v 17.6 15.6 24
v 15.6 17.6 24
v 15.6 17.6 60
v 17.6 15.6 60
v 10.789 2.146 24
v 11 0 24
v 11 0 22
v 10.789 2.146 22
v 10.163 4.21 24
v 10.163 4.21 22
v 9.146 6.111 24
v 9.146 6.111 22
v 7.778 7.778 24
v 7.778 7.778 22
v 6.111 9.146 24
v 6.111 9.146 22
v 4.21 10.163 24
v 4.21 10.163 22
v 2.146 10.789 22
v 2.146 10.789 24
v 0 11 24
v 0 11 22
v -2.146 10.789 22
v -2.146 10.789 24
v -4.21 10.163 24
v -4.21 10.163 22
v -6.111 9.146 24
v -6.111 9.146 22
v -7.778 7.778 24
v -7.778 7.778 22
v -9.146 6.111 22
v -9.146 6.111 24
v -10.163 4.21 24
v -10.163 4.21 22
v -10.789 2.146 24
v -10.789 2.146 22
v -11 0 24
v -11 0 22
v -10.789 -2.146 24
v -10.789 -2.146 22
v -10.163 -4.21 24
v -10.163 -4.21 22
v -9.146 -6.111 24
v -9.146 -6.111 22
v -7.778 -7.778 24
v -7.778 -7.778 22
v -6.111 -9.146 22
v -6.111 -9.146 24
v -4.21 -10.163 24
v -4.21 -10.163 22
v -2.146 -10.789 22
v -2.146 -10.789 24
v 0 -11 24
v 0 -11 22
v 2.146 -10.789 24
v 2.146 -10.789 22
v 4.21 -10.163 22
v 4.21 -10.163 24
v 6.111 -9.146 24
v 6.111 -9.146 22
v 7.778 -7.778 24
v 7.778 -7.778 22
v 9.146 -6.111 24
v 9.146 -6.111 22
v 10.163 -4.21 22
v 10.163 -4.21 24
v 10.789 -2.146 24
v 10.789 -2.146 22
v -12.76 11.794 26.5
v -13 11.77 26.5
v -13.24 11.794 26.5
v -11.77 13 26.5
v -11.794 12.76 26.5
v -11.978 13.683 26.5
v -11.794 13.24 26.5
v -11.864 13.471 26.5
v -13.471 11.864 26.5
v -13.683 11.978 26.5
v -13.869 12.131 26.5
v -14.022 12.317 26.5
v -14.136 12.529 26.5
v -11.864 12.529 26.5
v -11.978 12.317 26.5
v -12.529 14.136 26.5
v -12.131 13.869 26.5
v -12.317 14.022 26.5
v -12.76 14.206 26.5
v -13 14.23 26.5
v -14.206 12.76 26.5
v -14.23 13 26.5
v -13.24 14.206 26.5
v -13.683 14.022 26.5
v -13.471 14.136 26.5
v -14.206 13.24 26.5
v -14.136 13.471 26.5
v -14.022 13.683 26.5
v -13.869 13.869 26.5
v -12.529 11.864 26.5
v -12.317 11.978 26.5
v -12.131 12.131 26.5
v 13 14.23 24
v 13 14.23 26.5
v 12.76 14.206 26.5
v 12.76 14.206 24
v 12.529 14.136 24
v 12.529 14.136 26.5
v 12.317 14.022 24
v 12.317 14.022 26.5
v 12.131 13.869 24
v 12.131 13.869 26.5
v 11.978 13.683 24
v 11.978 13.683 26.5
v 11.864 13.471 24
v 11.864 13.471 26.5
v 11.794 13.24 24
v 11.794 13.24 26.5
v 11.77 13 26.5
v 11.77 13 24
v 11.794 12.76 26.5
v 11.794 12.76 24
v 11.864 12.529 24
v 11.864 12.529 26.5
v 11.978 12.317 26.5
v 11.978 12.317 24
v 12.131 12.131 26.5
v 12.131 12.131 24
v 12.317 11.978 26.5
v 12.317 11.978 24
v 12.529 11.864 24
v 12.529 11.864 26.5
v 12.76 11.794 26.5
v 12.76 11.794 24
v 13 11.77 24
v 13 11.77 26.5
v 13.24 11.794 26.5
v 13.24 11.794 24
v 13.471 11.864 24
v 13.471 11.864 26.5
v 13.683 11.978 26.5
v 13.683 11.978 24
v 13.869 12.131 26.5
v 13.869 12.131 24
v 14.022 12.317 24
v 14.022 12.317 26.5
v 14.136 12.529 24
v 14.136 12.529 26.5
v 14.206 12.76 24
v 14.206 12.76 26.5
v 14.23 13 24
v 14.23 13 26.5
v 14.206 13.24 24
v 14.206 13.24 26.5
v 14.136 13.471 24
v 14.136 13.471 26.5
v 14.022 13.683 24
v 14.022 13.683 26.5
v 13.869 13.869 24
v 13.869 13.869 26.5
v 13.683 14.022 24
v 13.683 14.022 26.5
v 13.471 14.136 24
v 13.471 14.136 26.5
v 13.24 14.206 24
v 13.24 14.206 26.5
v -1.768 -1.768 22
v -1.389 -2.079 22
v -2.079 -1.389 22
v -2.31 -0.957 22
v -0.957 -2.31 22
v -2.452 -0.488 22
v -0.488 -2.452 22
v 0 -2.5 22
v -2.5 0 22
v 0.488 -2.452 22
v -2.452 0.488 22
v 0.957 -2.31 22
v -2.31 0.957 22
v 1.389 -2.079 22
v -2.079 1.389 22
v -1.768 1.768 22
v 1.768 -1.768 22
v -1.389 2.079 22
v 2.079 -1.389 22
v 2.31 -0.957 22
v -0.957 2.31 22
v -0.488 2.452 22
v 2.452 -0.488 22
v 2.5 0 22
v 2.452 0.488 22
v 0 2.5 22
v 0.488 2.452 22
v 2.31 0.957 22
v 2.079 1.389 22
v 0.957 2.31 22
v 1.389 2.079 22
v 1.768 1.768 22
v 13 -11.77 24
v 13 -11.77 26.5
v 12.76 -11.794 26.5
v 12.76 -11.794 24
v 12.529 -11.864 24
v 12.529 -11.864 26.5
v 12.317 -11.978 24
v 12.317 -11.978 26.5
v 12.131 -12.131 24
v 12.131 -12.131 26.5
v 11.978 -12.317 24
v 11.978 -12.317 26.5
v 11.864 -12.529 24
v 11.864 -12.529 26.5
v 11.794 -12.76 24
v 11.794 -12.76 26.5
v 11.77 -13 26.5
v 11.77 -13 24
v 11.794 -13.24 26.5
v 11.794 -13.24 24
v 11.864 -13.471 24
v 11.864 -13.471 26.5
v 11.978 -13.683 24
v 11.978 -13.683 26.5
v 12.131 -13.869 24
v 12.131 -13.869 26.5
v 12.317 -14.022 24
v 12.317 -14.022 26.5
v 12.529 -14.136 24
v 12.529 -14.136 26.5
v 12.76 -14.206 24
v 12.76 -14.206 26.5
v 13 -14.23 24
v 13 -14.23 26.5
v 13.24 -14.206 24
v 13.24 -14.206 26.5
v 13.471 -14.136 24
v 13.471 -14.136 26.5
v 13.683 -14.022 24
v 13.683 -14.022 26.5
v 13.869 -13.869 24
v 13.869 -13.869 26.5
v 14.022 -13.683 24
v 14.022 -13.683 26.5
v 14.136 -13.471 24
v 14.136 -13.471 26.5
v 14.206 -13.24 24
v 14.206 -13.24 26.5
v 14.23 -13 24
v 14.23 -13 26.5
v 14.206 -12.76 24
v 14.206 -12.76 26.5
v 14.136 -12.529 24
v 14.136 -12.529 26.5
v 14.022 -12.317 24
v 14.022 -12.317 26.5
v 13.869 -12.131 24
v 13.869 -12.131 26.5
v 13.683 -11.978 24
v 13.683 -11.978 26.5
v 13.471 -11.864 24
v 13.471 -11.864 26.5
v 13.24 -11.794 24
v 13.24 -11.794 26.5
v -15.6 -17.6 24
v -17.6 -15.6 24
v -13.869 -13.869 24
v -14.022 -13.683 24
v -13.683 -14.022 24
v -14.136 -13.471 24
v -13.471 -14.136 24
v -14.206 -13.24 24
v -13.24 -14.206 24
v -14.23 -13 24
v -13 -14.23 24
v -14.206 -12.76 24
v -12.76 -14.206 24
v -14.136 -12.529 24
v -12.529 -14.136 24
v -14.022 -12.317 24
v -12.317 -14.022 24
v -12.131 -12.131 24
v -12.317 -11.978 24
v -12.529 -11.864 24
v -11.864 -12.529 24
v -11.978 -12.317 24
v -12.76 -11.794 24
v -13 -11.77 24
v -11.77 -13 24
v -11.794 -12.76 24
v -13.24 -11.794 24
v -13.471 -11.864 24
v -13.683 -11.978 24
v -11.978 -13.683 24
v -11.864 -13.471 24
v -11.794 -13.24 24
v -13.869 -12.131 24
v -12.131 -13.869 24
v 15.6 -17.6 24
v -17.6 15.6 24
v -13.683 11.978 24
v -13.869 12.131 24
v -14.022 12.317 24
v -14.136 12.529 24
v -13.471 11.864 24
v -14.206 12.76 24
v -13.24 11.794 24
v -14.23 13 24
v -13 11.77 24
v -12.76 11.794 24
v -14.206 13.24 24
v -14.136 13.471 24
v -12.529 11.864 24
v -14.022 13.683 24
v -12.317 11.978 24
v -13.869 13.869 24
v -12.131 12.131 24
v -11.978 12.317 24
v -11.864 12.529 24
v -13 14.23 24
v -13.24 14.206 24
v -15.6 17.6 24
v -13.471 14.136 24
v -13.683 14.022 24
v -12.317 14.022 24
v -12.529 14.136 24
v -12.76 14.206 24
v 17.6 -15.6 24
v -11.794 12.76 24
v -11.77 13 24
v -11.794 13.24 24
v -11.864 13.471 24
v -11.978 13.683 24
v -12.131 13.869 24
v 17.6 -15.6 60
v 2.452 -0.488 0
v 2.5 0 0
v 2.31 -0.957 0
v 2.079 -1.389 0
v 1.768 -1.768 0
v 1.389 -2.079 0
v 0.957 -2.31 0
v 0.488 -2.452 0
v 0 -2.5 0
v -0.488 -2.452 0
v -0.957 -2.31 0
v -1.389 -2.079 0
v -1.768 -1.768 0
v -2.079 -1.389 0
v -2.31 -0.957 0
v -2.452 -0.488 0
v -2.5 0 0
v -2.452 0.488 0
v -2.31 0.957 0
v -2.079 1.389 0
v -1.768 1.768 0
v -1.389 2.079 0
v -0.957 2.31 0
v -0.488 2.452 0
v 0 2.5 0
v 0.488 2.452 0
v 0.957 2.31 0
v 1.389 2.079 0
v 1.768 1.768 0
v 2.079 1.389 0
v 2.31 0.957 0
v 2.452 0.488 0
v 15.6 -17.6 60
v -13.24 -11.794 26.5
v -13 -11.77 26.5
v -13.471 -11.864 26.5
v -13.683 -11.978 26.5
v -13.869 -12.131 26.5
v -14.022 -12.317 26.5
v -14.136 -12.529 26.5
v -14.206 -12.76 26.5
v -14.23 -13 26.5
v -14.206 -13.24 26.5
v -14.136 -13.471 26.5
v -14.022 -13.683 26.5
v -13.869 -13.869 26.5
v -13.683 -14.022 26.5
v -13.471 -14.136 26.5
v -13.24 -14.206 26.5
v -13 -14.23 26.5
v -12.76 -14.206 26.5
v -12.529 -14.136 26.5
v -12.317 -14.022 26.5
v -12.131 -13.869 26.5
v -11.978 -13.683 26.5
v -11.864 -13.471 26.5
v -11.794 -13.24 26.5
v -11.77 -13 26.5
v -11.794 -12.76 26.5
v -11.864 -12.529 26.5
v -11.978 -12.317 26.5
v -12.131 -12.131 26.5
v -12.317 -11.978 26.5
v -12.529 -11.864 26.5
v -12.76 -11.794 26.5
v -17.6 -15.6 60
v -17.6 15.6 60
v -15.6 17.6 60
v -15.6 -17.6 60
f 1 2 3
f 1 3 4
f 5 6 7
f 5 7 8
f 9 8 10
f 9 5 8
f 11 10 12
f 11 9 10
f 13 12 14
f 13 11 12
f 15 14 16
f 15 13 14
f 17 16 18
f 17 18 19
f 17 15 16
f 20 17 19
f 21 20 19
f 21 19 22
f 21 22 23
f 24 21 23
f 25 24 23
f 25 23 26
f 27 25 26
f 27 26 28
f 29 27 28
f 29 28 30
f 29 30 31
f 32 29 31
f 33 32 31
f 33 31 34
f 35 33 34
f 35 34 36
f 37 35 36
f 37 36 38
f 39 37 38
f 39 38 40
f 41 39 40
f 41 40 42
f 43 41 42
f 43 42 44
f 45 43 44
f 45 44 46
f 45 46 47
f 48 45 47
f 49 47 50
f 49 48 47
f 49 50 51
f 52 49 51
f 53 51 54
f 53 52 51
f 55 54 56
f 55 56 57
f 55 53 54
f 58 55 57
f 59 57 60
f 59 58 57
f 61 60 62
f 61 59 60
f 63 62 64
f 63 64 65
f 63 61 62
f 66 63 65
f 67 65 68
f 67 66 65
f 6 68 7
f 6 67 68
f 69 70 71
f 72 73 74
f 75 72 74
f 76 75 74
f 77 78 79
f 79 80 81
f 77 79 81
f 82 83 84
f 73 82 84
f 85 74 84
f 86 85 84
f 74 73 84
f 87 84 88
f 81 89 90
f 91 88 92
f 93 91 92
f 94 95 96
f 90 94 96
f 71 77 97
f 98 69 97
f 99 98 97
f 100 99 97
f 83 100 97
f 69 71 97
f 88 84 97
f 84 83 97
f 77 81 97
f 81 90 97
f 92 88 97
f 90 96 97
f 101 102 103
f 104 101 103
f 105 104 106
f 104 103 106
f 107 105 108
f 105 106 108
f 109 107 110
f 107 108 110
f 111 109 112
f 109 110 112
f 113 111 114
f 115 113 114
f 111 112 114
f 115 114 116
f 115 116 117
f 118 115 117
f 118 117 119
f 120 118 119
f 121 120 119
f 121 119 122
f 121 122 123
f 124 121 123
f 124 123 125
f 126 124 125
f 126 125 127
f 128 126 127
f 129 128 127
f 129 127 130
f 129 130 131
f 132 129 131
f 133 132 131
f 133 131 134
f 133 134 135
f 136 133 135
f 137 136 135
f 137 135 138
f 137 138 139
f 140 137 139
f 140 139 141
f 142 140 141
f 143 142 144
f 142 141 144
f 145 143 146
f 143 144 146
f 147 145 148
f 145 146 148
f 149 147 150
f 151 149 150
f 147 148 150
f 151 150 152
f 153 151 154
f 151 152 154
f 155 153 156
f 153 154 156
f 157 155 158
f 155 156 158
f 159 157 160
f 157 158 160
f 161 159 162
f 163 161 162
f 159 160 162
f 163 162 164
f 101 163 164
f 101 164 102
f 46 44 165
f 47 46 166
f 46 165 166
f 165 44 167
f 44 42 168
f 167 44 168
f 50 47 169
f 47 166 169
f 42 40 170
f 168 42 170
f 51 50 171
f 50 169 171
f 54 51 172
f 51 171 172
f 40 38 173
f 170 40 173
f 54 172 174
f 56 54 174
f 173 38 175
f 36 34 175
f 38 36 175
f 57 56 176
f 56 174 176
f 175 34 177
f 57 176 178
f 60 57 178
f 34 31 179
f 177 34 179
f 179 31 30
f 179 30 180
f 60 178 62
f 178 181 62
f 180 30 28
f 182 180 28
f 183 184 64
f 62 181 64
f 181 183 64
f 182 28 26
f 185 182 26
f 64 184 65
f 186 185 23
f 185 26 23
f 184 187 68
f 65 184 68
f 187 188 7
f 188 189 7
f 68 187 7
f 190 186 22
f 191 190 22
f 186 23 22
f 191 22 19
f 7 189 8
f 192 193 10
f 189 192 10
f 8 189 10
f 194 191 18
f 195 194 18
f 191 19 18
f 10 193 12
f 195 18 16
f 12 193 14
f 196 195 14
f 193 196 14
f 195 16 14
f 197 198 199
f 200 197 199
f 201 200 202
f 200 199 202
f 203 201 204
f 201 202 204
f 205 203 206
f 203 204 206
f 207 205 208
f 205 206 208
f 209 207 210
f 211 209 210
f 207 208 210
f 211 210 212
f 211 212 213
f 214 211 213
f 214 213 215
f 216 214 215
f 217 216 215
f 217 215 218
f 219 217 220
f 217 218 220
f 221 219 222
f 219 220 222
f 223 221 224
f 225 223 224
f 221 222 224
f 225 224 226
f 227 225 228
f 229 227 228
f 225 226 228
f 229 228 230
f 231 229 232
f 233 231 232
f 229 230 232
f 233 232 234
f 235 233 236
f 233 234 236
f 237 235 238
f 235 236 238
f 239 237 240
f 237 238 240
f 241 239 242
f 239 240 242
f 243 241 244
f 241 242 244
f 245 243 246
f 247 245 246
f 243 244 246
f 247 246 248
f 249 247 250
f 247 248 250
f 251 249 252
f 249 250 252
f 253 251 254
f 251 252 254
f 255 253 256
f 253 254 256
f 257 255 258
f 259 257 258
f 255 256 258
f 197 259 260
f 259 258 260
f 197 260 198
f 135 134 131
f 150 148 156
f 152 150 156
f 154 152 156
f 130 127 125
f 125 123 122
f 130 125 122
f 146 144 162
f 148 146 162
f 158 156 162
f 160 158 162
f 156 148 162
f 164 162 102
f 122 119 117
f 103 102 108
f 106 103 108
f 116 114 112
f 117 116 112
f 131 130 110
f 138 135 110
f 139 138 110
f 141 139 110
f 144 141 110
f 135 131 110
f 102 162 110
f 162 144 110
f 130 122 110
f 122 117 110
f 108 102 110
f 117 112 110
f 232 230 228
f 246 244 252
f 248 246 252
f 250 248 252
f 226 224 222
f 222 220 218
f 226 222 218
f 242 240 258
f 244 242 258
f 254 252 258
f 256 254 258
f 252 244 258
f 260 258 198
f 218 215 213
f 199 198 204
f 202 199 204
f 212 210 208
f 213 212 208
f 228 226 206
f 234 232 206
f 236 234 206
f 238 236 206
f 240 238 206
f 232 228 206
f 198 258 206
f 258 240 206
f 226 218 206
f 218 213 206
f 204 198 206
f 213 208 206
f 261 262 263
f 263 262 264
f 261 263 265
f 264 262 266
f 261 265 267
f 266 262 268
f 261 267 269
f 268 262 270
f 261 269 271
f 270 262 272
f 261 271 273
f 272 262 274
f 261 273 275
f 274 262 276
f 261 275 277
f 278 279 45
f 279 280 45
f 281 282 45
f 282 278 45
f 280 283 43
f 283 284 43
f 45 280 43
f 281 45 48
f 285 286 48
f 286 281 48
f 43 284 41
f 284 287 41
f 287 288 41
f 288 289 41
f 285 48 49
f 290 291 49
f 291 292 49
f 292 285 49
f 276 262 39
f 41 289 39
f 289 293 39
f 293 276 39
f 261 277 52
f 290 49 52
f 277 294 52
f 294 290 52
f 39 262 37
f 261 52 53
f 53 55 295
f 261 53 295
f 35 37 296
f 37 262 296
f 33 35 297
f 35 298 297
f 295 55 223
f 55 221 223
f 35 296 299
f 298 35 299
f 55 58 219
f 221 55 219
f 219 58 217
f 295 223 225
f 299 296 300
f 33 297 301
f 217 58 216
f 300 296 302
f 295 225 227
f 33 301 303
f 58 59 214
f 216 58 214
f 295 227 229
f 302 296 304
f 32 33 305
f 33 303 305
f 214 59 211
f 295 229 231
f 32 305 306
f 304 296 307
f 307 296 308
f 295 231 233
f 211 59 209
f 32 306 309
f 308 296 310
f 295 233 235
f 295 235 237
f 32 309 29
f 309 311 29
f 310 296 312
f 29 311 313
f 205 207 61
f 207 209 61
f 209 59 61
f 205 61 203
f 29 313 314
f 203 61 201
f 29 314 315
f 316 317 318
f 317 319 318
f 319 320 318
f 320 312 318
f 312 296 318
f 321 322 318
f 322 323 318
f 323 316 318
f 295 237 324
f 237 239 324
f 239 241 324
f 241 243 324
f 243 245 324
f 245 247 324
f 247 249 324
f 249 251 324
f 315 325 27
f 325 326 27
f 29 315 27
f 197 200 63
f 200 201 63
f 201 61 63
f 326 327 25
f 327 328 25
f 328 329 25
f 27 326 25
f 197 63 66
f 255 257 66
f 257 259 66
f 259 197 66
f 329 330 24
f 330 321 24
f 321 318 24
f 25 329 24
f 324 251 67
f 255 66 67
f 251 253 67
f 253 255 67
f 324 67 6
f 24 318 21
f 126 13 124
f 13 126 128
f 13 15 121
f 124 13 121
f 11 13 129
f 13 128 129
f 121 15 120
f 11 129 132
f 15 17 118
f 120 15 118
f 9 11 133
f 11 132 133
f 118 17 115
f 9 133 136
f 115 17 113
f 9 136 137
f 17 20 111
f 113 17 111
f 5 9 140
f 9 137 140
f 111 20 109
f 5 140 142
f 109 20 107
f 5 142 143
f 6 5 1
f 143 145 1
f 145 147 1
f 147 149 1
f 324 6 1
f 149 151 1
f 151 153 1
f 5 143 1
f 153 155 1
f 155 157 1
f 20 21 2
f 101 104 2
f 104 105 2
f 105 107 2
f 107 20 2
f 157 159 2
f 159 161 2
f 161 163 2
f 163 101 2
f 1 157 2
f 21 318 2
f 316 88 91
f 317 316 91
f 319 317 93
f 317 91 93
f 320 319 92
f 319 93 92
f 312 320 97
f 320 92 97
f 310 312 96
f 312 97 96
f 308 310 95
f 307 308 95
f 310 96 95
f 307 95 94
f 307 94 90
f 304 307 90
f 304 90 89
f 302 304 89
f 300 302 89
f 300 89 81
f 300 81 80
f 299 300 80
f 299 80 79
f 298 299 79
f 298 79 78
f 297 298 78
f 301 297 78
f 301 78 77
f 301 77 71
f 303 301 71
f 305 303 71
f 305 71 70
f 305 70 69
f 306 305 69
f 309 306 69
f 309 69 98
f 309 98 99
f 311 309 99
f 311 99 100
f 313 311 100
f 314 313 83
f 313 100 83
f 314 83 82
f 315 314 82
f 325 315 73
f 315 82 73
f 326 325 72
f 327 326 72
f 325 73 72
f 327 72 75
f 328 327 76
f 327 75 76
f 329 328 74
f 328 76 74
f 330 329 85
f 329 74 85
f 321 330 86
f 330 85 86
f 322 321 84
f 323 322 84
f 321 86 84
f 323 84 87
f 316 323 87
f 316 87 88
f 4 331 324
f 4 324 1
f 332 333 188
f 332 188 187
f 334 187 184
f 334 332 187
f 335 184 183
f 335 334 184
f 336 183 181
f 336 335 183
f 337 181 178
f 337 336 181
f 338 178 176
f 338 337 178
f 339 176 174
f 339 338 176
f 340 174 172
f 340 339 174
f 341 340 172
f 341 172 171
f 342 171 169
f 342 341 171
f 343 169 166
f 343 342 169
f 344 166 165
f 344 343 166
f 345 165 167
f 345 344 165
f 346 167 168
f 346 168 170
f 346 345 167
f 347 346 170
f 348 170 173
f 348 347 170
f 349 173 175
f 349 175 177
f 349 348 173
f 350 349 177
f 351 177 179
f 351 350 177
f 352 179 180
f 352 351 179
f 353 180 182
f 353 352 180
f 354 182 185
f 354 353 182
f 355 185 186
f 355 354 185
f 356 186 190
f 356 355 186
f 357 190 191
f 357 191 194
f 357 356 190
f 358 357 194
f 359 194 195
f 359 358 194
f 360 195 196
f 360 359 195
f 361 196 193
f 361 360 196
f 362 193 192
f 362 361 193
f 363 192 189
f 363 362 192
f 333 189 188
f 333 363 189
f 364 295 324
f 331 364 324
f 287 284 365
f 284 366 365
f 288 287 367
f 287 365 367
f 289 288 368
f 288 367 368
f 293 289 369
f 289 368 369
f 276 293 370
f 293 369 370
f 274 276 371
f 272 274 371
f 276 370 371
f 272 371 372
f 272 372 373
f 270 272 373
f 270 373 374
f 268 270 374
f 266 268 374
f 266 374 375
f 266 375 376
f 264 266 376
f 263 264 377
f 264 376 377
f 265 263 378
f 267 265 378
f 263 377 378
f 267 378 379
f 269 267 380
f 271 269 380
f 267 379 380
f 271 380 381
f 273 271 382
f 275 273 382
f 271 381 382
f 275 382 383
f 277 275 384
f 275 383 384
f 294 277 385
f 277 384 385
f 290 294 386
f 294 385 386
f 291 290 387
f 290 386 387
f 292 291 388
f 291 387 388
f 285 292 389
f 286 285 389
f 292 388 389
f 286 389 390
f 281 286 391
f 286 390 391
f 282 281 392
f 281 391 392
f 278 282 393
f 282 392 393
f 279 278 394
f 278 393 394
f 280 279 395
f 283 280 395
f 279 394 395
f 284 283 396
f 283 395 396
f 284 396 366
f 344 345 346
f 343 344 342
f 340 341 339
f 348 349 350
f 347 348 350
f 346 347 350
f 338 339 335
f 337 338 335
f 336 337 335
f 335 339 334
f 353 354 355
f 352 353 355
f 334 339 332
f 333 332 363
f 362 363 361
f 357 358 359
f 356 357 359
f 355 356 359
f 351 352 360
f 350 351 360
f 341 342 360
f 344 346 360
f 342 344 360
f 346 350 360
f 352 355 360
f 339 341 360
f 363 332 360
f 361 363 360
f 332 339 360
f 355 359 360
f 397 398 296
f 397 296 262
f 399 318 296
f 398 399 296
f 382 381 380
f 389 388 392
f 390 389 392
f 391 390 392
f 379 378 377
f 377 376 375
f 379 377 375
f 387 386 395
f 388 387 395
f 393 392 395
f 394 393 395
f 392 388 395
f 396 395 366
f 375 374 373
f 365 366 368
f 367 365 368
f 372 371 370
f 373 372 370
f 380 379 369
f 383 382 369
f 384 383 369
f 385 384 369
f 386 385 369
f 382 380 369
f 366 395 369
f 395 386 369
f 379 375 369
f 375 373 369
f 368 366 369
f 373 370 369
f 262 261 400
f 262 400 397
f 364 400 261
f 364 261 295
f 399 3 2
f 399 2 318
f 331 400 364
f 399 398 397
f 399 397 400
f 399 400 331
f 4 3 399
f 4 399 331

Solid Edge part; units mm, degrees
sketch "Sketch1" plane through (0, 0, 0) normal (0, 0, 1) x (1, 0, 0)
  circle A0 centre (0, 0) radius 2.5
extrude "Protrusion1" add sketch "Sketch1" along normal blind 24
sketch "Sketch2" plane through (0, 0, 24) normal (0, 0, 1) x (1, 0, 0)
  circle A0 centre (0, 0) radius 11
extrude "ExtrudedProtrusion_2" add sketch "Sketch2" against normal blind 2
sketch "Sketch3" plane through (0, 0, 24) normal (0, 0, 1) x (1, 0, 0)
  line L0 (-15.6, -17.6) -> (15.6, -17.6)
  line L1 (15.6, -17.6) -> (17.6, -15.6)
  line L2 (17.6, -15.6) -> (17.6, 15.6)
  line L3 (15.6, 17.6) -> (17.6, 15.6)
  line L4 (15.6, 17.6) -> (-15.6, 17.6)
  line L5 (-15.6, 17.6) -> (-17.6, 15.6)
  line L6 (-17.6, 15.6) -> (-17.6, -15.6)
  line L7 (-15.6, -17.6) -> (-17.6, -15.6)
extrude "ExtrudedProtrusion_3" add sketch "Sketch3" along normal blind 36
hole "Hole_1" at (-13, -13, 24) direction (0, 0, 1) diameter 2.459 depth 2.5 thread major 3 thread length 2.5
hole "Hole1" at (-13, 13, 24) direction (0, 0, 1) diameter 2.459 depth 2.5 thread major 3 thread length 2.5
hole "Hole2" at (13, 13, 24) direction (0, 0, 1) diameter 2.459 depth 2.5 thread major 3 thread length 2.5
hole "Hole3" at (13, -13, 24) direction (0, 0, 1) diameter 2.459 depth 2.5 thread major 3 thread length 2.5
extrude "ExtrudedProtrusion_4" [suppressed]
